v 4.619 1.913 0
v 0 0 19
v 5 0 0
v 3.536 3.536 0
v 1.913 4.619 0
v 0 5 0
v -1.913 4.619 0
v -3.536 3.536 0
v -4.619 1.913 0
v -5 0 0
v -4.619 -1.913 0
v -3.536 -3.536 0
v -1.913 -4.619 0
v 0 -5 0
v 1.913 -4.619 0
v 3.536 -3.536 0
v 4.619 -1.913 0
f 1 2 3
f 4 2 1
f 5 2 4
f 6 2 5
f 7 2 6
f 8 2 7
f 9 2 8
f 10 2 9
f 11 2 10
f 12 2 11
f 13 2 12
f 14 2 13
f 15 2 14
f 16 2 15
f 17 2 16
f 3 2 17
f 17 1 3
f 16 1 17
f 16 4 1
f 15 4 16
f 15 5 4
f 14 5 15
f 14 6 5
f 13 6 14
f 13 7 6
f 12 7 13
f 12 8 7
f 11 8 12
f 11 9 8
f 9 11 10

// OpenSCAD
// Generated by SolidPython 1.0.1 on 2020-07-29 00:46:43


cylinder(h = 19, r1 = 5, r2 = 0);
/***********************************************
*********      SolidPython code:      **********
************************************************
 
# import packages: SolidPython
from solid import *
from solid.utils import *
from itertools import chain, combinations, permutations


class Resize:

    def __init__(self, scad_file):
        self.scad_file = scad_file
        #self.scad_file = import_scad(scad_file)
        # cone/cylinder param:
        self.r1 = 0
        self.r2 = 0
        self.h = 0
        # rectangular prism param:
        self.w = 0
        self.l = 0
        # ellipse param:
        self.r = 0

    # import OpenScad code (file name corresponds to shape)


    # classify shape + parameters
    def assign(self, param1, param2, param3):
        if self.scad_file == 'cone.scad':
            self.r1 = param1
            self.r2 = param2
            self.h = param3
        elif self.scad_file == 'cylinder.scad':
            self.r1 = param1
            self.r2 = param2
            self.h = param3
        elif self.scad_file == 'rectangularPrism.scad':
            self.h = param1
            self.l = param2
            self.w = param3
        else:
            self.r = param1
            self.h = param2

    # resize parameters
    def iterate(self):
        x = range(3, 20, 2)
        i = 1
        if self.scad_file == 'cone.scad':
            tempList = list(permutations(x, 2))
            for temp in tempList:
                param1 = temp[0]
                param2 = temp[1]
                filepath = 'produced_scad_files/' + 'cone' + str(param1) + '_' + str(param2) + '_' + '.scad'
                scad_render_to_file(cylinder(h=param1, r1=param2, r2=0), filepath)

        elif self.scad_file == 'cylinder.scad':
            tempList = list(permutations(x, 3))
            for temp in tempList:
                param1 = temp[0]
                param2 = temp[1]
                filepath = 'produced_scad_files/' + 'cylinder' + str(param1) + '_' + str(param2) + '_' + '.scad'
                scad_render_to_file(cylinder(h=param1, r1=param2, r2=param2), filepath)

        elif self.scad_file == 'rectangularPrism.scad':
            tempList = list(permutations(x, 3))
            for temp in tempList:
                param1 = temp[0]
                param2 = temp[1]
                param3 = temp[2]
                filepath = 'produced_scad_files/' + 'rectangularPrism' + str(param1) + '_' + str(param2) + '_' + str(
                    param3) + '.scad'
                scad_render_to_file(cube(size=(param1, param2, param3)), filepath)

        elif self.scad_file == 'ellipse.scad':
            tempList = list(permutations(x, 4))
            for temp in tempList:
                param1 = temp[0]
                param2 = temp[1]
                param3 = temp[2]
                param4 = temp[3]
                filepath = 'produced_scad_files/' + 'ellipse' + str(param1) + '_' + str(param2) + '_' + str(param3) + '_' + str(param4) + '.scad'
                scad_render_to_file(scale([param1, param2, param3])(sphere(r=param4)), filepath)

    def render_to_scadfile(self):
        scad_render_to_file(scad, 'example.scad') 
 
************************************************/
